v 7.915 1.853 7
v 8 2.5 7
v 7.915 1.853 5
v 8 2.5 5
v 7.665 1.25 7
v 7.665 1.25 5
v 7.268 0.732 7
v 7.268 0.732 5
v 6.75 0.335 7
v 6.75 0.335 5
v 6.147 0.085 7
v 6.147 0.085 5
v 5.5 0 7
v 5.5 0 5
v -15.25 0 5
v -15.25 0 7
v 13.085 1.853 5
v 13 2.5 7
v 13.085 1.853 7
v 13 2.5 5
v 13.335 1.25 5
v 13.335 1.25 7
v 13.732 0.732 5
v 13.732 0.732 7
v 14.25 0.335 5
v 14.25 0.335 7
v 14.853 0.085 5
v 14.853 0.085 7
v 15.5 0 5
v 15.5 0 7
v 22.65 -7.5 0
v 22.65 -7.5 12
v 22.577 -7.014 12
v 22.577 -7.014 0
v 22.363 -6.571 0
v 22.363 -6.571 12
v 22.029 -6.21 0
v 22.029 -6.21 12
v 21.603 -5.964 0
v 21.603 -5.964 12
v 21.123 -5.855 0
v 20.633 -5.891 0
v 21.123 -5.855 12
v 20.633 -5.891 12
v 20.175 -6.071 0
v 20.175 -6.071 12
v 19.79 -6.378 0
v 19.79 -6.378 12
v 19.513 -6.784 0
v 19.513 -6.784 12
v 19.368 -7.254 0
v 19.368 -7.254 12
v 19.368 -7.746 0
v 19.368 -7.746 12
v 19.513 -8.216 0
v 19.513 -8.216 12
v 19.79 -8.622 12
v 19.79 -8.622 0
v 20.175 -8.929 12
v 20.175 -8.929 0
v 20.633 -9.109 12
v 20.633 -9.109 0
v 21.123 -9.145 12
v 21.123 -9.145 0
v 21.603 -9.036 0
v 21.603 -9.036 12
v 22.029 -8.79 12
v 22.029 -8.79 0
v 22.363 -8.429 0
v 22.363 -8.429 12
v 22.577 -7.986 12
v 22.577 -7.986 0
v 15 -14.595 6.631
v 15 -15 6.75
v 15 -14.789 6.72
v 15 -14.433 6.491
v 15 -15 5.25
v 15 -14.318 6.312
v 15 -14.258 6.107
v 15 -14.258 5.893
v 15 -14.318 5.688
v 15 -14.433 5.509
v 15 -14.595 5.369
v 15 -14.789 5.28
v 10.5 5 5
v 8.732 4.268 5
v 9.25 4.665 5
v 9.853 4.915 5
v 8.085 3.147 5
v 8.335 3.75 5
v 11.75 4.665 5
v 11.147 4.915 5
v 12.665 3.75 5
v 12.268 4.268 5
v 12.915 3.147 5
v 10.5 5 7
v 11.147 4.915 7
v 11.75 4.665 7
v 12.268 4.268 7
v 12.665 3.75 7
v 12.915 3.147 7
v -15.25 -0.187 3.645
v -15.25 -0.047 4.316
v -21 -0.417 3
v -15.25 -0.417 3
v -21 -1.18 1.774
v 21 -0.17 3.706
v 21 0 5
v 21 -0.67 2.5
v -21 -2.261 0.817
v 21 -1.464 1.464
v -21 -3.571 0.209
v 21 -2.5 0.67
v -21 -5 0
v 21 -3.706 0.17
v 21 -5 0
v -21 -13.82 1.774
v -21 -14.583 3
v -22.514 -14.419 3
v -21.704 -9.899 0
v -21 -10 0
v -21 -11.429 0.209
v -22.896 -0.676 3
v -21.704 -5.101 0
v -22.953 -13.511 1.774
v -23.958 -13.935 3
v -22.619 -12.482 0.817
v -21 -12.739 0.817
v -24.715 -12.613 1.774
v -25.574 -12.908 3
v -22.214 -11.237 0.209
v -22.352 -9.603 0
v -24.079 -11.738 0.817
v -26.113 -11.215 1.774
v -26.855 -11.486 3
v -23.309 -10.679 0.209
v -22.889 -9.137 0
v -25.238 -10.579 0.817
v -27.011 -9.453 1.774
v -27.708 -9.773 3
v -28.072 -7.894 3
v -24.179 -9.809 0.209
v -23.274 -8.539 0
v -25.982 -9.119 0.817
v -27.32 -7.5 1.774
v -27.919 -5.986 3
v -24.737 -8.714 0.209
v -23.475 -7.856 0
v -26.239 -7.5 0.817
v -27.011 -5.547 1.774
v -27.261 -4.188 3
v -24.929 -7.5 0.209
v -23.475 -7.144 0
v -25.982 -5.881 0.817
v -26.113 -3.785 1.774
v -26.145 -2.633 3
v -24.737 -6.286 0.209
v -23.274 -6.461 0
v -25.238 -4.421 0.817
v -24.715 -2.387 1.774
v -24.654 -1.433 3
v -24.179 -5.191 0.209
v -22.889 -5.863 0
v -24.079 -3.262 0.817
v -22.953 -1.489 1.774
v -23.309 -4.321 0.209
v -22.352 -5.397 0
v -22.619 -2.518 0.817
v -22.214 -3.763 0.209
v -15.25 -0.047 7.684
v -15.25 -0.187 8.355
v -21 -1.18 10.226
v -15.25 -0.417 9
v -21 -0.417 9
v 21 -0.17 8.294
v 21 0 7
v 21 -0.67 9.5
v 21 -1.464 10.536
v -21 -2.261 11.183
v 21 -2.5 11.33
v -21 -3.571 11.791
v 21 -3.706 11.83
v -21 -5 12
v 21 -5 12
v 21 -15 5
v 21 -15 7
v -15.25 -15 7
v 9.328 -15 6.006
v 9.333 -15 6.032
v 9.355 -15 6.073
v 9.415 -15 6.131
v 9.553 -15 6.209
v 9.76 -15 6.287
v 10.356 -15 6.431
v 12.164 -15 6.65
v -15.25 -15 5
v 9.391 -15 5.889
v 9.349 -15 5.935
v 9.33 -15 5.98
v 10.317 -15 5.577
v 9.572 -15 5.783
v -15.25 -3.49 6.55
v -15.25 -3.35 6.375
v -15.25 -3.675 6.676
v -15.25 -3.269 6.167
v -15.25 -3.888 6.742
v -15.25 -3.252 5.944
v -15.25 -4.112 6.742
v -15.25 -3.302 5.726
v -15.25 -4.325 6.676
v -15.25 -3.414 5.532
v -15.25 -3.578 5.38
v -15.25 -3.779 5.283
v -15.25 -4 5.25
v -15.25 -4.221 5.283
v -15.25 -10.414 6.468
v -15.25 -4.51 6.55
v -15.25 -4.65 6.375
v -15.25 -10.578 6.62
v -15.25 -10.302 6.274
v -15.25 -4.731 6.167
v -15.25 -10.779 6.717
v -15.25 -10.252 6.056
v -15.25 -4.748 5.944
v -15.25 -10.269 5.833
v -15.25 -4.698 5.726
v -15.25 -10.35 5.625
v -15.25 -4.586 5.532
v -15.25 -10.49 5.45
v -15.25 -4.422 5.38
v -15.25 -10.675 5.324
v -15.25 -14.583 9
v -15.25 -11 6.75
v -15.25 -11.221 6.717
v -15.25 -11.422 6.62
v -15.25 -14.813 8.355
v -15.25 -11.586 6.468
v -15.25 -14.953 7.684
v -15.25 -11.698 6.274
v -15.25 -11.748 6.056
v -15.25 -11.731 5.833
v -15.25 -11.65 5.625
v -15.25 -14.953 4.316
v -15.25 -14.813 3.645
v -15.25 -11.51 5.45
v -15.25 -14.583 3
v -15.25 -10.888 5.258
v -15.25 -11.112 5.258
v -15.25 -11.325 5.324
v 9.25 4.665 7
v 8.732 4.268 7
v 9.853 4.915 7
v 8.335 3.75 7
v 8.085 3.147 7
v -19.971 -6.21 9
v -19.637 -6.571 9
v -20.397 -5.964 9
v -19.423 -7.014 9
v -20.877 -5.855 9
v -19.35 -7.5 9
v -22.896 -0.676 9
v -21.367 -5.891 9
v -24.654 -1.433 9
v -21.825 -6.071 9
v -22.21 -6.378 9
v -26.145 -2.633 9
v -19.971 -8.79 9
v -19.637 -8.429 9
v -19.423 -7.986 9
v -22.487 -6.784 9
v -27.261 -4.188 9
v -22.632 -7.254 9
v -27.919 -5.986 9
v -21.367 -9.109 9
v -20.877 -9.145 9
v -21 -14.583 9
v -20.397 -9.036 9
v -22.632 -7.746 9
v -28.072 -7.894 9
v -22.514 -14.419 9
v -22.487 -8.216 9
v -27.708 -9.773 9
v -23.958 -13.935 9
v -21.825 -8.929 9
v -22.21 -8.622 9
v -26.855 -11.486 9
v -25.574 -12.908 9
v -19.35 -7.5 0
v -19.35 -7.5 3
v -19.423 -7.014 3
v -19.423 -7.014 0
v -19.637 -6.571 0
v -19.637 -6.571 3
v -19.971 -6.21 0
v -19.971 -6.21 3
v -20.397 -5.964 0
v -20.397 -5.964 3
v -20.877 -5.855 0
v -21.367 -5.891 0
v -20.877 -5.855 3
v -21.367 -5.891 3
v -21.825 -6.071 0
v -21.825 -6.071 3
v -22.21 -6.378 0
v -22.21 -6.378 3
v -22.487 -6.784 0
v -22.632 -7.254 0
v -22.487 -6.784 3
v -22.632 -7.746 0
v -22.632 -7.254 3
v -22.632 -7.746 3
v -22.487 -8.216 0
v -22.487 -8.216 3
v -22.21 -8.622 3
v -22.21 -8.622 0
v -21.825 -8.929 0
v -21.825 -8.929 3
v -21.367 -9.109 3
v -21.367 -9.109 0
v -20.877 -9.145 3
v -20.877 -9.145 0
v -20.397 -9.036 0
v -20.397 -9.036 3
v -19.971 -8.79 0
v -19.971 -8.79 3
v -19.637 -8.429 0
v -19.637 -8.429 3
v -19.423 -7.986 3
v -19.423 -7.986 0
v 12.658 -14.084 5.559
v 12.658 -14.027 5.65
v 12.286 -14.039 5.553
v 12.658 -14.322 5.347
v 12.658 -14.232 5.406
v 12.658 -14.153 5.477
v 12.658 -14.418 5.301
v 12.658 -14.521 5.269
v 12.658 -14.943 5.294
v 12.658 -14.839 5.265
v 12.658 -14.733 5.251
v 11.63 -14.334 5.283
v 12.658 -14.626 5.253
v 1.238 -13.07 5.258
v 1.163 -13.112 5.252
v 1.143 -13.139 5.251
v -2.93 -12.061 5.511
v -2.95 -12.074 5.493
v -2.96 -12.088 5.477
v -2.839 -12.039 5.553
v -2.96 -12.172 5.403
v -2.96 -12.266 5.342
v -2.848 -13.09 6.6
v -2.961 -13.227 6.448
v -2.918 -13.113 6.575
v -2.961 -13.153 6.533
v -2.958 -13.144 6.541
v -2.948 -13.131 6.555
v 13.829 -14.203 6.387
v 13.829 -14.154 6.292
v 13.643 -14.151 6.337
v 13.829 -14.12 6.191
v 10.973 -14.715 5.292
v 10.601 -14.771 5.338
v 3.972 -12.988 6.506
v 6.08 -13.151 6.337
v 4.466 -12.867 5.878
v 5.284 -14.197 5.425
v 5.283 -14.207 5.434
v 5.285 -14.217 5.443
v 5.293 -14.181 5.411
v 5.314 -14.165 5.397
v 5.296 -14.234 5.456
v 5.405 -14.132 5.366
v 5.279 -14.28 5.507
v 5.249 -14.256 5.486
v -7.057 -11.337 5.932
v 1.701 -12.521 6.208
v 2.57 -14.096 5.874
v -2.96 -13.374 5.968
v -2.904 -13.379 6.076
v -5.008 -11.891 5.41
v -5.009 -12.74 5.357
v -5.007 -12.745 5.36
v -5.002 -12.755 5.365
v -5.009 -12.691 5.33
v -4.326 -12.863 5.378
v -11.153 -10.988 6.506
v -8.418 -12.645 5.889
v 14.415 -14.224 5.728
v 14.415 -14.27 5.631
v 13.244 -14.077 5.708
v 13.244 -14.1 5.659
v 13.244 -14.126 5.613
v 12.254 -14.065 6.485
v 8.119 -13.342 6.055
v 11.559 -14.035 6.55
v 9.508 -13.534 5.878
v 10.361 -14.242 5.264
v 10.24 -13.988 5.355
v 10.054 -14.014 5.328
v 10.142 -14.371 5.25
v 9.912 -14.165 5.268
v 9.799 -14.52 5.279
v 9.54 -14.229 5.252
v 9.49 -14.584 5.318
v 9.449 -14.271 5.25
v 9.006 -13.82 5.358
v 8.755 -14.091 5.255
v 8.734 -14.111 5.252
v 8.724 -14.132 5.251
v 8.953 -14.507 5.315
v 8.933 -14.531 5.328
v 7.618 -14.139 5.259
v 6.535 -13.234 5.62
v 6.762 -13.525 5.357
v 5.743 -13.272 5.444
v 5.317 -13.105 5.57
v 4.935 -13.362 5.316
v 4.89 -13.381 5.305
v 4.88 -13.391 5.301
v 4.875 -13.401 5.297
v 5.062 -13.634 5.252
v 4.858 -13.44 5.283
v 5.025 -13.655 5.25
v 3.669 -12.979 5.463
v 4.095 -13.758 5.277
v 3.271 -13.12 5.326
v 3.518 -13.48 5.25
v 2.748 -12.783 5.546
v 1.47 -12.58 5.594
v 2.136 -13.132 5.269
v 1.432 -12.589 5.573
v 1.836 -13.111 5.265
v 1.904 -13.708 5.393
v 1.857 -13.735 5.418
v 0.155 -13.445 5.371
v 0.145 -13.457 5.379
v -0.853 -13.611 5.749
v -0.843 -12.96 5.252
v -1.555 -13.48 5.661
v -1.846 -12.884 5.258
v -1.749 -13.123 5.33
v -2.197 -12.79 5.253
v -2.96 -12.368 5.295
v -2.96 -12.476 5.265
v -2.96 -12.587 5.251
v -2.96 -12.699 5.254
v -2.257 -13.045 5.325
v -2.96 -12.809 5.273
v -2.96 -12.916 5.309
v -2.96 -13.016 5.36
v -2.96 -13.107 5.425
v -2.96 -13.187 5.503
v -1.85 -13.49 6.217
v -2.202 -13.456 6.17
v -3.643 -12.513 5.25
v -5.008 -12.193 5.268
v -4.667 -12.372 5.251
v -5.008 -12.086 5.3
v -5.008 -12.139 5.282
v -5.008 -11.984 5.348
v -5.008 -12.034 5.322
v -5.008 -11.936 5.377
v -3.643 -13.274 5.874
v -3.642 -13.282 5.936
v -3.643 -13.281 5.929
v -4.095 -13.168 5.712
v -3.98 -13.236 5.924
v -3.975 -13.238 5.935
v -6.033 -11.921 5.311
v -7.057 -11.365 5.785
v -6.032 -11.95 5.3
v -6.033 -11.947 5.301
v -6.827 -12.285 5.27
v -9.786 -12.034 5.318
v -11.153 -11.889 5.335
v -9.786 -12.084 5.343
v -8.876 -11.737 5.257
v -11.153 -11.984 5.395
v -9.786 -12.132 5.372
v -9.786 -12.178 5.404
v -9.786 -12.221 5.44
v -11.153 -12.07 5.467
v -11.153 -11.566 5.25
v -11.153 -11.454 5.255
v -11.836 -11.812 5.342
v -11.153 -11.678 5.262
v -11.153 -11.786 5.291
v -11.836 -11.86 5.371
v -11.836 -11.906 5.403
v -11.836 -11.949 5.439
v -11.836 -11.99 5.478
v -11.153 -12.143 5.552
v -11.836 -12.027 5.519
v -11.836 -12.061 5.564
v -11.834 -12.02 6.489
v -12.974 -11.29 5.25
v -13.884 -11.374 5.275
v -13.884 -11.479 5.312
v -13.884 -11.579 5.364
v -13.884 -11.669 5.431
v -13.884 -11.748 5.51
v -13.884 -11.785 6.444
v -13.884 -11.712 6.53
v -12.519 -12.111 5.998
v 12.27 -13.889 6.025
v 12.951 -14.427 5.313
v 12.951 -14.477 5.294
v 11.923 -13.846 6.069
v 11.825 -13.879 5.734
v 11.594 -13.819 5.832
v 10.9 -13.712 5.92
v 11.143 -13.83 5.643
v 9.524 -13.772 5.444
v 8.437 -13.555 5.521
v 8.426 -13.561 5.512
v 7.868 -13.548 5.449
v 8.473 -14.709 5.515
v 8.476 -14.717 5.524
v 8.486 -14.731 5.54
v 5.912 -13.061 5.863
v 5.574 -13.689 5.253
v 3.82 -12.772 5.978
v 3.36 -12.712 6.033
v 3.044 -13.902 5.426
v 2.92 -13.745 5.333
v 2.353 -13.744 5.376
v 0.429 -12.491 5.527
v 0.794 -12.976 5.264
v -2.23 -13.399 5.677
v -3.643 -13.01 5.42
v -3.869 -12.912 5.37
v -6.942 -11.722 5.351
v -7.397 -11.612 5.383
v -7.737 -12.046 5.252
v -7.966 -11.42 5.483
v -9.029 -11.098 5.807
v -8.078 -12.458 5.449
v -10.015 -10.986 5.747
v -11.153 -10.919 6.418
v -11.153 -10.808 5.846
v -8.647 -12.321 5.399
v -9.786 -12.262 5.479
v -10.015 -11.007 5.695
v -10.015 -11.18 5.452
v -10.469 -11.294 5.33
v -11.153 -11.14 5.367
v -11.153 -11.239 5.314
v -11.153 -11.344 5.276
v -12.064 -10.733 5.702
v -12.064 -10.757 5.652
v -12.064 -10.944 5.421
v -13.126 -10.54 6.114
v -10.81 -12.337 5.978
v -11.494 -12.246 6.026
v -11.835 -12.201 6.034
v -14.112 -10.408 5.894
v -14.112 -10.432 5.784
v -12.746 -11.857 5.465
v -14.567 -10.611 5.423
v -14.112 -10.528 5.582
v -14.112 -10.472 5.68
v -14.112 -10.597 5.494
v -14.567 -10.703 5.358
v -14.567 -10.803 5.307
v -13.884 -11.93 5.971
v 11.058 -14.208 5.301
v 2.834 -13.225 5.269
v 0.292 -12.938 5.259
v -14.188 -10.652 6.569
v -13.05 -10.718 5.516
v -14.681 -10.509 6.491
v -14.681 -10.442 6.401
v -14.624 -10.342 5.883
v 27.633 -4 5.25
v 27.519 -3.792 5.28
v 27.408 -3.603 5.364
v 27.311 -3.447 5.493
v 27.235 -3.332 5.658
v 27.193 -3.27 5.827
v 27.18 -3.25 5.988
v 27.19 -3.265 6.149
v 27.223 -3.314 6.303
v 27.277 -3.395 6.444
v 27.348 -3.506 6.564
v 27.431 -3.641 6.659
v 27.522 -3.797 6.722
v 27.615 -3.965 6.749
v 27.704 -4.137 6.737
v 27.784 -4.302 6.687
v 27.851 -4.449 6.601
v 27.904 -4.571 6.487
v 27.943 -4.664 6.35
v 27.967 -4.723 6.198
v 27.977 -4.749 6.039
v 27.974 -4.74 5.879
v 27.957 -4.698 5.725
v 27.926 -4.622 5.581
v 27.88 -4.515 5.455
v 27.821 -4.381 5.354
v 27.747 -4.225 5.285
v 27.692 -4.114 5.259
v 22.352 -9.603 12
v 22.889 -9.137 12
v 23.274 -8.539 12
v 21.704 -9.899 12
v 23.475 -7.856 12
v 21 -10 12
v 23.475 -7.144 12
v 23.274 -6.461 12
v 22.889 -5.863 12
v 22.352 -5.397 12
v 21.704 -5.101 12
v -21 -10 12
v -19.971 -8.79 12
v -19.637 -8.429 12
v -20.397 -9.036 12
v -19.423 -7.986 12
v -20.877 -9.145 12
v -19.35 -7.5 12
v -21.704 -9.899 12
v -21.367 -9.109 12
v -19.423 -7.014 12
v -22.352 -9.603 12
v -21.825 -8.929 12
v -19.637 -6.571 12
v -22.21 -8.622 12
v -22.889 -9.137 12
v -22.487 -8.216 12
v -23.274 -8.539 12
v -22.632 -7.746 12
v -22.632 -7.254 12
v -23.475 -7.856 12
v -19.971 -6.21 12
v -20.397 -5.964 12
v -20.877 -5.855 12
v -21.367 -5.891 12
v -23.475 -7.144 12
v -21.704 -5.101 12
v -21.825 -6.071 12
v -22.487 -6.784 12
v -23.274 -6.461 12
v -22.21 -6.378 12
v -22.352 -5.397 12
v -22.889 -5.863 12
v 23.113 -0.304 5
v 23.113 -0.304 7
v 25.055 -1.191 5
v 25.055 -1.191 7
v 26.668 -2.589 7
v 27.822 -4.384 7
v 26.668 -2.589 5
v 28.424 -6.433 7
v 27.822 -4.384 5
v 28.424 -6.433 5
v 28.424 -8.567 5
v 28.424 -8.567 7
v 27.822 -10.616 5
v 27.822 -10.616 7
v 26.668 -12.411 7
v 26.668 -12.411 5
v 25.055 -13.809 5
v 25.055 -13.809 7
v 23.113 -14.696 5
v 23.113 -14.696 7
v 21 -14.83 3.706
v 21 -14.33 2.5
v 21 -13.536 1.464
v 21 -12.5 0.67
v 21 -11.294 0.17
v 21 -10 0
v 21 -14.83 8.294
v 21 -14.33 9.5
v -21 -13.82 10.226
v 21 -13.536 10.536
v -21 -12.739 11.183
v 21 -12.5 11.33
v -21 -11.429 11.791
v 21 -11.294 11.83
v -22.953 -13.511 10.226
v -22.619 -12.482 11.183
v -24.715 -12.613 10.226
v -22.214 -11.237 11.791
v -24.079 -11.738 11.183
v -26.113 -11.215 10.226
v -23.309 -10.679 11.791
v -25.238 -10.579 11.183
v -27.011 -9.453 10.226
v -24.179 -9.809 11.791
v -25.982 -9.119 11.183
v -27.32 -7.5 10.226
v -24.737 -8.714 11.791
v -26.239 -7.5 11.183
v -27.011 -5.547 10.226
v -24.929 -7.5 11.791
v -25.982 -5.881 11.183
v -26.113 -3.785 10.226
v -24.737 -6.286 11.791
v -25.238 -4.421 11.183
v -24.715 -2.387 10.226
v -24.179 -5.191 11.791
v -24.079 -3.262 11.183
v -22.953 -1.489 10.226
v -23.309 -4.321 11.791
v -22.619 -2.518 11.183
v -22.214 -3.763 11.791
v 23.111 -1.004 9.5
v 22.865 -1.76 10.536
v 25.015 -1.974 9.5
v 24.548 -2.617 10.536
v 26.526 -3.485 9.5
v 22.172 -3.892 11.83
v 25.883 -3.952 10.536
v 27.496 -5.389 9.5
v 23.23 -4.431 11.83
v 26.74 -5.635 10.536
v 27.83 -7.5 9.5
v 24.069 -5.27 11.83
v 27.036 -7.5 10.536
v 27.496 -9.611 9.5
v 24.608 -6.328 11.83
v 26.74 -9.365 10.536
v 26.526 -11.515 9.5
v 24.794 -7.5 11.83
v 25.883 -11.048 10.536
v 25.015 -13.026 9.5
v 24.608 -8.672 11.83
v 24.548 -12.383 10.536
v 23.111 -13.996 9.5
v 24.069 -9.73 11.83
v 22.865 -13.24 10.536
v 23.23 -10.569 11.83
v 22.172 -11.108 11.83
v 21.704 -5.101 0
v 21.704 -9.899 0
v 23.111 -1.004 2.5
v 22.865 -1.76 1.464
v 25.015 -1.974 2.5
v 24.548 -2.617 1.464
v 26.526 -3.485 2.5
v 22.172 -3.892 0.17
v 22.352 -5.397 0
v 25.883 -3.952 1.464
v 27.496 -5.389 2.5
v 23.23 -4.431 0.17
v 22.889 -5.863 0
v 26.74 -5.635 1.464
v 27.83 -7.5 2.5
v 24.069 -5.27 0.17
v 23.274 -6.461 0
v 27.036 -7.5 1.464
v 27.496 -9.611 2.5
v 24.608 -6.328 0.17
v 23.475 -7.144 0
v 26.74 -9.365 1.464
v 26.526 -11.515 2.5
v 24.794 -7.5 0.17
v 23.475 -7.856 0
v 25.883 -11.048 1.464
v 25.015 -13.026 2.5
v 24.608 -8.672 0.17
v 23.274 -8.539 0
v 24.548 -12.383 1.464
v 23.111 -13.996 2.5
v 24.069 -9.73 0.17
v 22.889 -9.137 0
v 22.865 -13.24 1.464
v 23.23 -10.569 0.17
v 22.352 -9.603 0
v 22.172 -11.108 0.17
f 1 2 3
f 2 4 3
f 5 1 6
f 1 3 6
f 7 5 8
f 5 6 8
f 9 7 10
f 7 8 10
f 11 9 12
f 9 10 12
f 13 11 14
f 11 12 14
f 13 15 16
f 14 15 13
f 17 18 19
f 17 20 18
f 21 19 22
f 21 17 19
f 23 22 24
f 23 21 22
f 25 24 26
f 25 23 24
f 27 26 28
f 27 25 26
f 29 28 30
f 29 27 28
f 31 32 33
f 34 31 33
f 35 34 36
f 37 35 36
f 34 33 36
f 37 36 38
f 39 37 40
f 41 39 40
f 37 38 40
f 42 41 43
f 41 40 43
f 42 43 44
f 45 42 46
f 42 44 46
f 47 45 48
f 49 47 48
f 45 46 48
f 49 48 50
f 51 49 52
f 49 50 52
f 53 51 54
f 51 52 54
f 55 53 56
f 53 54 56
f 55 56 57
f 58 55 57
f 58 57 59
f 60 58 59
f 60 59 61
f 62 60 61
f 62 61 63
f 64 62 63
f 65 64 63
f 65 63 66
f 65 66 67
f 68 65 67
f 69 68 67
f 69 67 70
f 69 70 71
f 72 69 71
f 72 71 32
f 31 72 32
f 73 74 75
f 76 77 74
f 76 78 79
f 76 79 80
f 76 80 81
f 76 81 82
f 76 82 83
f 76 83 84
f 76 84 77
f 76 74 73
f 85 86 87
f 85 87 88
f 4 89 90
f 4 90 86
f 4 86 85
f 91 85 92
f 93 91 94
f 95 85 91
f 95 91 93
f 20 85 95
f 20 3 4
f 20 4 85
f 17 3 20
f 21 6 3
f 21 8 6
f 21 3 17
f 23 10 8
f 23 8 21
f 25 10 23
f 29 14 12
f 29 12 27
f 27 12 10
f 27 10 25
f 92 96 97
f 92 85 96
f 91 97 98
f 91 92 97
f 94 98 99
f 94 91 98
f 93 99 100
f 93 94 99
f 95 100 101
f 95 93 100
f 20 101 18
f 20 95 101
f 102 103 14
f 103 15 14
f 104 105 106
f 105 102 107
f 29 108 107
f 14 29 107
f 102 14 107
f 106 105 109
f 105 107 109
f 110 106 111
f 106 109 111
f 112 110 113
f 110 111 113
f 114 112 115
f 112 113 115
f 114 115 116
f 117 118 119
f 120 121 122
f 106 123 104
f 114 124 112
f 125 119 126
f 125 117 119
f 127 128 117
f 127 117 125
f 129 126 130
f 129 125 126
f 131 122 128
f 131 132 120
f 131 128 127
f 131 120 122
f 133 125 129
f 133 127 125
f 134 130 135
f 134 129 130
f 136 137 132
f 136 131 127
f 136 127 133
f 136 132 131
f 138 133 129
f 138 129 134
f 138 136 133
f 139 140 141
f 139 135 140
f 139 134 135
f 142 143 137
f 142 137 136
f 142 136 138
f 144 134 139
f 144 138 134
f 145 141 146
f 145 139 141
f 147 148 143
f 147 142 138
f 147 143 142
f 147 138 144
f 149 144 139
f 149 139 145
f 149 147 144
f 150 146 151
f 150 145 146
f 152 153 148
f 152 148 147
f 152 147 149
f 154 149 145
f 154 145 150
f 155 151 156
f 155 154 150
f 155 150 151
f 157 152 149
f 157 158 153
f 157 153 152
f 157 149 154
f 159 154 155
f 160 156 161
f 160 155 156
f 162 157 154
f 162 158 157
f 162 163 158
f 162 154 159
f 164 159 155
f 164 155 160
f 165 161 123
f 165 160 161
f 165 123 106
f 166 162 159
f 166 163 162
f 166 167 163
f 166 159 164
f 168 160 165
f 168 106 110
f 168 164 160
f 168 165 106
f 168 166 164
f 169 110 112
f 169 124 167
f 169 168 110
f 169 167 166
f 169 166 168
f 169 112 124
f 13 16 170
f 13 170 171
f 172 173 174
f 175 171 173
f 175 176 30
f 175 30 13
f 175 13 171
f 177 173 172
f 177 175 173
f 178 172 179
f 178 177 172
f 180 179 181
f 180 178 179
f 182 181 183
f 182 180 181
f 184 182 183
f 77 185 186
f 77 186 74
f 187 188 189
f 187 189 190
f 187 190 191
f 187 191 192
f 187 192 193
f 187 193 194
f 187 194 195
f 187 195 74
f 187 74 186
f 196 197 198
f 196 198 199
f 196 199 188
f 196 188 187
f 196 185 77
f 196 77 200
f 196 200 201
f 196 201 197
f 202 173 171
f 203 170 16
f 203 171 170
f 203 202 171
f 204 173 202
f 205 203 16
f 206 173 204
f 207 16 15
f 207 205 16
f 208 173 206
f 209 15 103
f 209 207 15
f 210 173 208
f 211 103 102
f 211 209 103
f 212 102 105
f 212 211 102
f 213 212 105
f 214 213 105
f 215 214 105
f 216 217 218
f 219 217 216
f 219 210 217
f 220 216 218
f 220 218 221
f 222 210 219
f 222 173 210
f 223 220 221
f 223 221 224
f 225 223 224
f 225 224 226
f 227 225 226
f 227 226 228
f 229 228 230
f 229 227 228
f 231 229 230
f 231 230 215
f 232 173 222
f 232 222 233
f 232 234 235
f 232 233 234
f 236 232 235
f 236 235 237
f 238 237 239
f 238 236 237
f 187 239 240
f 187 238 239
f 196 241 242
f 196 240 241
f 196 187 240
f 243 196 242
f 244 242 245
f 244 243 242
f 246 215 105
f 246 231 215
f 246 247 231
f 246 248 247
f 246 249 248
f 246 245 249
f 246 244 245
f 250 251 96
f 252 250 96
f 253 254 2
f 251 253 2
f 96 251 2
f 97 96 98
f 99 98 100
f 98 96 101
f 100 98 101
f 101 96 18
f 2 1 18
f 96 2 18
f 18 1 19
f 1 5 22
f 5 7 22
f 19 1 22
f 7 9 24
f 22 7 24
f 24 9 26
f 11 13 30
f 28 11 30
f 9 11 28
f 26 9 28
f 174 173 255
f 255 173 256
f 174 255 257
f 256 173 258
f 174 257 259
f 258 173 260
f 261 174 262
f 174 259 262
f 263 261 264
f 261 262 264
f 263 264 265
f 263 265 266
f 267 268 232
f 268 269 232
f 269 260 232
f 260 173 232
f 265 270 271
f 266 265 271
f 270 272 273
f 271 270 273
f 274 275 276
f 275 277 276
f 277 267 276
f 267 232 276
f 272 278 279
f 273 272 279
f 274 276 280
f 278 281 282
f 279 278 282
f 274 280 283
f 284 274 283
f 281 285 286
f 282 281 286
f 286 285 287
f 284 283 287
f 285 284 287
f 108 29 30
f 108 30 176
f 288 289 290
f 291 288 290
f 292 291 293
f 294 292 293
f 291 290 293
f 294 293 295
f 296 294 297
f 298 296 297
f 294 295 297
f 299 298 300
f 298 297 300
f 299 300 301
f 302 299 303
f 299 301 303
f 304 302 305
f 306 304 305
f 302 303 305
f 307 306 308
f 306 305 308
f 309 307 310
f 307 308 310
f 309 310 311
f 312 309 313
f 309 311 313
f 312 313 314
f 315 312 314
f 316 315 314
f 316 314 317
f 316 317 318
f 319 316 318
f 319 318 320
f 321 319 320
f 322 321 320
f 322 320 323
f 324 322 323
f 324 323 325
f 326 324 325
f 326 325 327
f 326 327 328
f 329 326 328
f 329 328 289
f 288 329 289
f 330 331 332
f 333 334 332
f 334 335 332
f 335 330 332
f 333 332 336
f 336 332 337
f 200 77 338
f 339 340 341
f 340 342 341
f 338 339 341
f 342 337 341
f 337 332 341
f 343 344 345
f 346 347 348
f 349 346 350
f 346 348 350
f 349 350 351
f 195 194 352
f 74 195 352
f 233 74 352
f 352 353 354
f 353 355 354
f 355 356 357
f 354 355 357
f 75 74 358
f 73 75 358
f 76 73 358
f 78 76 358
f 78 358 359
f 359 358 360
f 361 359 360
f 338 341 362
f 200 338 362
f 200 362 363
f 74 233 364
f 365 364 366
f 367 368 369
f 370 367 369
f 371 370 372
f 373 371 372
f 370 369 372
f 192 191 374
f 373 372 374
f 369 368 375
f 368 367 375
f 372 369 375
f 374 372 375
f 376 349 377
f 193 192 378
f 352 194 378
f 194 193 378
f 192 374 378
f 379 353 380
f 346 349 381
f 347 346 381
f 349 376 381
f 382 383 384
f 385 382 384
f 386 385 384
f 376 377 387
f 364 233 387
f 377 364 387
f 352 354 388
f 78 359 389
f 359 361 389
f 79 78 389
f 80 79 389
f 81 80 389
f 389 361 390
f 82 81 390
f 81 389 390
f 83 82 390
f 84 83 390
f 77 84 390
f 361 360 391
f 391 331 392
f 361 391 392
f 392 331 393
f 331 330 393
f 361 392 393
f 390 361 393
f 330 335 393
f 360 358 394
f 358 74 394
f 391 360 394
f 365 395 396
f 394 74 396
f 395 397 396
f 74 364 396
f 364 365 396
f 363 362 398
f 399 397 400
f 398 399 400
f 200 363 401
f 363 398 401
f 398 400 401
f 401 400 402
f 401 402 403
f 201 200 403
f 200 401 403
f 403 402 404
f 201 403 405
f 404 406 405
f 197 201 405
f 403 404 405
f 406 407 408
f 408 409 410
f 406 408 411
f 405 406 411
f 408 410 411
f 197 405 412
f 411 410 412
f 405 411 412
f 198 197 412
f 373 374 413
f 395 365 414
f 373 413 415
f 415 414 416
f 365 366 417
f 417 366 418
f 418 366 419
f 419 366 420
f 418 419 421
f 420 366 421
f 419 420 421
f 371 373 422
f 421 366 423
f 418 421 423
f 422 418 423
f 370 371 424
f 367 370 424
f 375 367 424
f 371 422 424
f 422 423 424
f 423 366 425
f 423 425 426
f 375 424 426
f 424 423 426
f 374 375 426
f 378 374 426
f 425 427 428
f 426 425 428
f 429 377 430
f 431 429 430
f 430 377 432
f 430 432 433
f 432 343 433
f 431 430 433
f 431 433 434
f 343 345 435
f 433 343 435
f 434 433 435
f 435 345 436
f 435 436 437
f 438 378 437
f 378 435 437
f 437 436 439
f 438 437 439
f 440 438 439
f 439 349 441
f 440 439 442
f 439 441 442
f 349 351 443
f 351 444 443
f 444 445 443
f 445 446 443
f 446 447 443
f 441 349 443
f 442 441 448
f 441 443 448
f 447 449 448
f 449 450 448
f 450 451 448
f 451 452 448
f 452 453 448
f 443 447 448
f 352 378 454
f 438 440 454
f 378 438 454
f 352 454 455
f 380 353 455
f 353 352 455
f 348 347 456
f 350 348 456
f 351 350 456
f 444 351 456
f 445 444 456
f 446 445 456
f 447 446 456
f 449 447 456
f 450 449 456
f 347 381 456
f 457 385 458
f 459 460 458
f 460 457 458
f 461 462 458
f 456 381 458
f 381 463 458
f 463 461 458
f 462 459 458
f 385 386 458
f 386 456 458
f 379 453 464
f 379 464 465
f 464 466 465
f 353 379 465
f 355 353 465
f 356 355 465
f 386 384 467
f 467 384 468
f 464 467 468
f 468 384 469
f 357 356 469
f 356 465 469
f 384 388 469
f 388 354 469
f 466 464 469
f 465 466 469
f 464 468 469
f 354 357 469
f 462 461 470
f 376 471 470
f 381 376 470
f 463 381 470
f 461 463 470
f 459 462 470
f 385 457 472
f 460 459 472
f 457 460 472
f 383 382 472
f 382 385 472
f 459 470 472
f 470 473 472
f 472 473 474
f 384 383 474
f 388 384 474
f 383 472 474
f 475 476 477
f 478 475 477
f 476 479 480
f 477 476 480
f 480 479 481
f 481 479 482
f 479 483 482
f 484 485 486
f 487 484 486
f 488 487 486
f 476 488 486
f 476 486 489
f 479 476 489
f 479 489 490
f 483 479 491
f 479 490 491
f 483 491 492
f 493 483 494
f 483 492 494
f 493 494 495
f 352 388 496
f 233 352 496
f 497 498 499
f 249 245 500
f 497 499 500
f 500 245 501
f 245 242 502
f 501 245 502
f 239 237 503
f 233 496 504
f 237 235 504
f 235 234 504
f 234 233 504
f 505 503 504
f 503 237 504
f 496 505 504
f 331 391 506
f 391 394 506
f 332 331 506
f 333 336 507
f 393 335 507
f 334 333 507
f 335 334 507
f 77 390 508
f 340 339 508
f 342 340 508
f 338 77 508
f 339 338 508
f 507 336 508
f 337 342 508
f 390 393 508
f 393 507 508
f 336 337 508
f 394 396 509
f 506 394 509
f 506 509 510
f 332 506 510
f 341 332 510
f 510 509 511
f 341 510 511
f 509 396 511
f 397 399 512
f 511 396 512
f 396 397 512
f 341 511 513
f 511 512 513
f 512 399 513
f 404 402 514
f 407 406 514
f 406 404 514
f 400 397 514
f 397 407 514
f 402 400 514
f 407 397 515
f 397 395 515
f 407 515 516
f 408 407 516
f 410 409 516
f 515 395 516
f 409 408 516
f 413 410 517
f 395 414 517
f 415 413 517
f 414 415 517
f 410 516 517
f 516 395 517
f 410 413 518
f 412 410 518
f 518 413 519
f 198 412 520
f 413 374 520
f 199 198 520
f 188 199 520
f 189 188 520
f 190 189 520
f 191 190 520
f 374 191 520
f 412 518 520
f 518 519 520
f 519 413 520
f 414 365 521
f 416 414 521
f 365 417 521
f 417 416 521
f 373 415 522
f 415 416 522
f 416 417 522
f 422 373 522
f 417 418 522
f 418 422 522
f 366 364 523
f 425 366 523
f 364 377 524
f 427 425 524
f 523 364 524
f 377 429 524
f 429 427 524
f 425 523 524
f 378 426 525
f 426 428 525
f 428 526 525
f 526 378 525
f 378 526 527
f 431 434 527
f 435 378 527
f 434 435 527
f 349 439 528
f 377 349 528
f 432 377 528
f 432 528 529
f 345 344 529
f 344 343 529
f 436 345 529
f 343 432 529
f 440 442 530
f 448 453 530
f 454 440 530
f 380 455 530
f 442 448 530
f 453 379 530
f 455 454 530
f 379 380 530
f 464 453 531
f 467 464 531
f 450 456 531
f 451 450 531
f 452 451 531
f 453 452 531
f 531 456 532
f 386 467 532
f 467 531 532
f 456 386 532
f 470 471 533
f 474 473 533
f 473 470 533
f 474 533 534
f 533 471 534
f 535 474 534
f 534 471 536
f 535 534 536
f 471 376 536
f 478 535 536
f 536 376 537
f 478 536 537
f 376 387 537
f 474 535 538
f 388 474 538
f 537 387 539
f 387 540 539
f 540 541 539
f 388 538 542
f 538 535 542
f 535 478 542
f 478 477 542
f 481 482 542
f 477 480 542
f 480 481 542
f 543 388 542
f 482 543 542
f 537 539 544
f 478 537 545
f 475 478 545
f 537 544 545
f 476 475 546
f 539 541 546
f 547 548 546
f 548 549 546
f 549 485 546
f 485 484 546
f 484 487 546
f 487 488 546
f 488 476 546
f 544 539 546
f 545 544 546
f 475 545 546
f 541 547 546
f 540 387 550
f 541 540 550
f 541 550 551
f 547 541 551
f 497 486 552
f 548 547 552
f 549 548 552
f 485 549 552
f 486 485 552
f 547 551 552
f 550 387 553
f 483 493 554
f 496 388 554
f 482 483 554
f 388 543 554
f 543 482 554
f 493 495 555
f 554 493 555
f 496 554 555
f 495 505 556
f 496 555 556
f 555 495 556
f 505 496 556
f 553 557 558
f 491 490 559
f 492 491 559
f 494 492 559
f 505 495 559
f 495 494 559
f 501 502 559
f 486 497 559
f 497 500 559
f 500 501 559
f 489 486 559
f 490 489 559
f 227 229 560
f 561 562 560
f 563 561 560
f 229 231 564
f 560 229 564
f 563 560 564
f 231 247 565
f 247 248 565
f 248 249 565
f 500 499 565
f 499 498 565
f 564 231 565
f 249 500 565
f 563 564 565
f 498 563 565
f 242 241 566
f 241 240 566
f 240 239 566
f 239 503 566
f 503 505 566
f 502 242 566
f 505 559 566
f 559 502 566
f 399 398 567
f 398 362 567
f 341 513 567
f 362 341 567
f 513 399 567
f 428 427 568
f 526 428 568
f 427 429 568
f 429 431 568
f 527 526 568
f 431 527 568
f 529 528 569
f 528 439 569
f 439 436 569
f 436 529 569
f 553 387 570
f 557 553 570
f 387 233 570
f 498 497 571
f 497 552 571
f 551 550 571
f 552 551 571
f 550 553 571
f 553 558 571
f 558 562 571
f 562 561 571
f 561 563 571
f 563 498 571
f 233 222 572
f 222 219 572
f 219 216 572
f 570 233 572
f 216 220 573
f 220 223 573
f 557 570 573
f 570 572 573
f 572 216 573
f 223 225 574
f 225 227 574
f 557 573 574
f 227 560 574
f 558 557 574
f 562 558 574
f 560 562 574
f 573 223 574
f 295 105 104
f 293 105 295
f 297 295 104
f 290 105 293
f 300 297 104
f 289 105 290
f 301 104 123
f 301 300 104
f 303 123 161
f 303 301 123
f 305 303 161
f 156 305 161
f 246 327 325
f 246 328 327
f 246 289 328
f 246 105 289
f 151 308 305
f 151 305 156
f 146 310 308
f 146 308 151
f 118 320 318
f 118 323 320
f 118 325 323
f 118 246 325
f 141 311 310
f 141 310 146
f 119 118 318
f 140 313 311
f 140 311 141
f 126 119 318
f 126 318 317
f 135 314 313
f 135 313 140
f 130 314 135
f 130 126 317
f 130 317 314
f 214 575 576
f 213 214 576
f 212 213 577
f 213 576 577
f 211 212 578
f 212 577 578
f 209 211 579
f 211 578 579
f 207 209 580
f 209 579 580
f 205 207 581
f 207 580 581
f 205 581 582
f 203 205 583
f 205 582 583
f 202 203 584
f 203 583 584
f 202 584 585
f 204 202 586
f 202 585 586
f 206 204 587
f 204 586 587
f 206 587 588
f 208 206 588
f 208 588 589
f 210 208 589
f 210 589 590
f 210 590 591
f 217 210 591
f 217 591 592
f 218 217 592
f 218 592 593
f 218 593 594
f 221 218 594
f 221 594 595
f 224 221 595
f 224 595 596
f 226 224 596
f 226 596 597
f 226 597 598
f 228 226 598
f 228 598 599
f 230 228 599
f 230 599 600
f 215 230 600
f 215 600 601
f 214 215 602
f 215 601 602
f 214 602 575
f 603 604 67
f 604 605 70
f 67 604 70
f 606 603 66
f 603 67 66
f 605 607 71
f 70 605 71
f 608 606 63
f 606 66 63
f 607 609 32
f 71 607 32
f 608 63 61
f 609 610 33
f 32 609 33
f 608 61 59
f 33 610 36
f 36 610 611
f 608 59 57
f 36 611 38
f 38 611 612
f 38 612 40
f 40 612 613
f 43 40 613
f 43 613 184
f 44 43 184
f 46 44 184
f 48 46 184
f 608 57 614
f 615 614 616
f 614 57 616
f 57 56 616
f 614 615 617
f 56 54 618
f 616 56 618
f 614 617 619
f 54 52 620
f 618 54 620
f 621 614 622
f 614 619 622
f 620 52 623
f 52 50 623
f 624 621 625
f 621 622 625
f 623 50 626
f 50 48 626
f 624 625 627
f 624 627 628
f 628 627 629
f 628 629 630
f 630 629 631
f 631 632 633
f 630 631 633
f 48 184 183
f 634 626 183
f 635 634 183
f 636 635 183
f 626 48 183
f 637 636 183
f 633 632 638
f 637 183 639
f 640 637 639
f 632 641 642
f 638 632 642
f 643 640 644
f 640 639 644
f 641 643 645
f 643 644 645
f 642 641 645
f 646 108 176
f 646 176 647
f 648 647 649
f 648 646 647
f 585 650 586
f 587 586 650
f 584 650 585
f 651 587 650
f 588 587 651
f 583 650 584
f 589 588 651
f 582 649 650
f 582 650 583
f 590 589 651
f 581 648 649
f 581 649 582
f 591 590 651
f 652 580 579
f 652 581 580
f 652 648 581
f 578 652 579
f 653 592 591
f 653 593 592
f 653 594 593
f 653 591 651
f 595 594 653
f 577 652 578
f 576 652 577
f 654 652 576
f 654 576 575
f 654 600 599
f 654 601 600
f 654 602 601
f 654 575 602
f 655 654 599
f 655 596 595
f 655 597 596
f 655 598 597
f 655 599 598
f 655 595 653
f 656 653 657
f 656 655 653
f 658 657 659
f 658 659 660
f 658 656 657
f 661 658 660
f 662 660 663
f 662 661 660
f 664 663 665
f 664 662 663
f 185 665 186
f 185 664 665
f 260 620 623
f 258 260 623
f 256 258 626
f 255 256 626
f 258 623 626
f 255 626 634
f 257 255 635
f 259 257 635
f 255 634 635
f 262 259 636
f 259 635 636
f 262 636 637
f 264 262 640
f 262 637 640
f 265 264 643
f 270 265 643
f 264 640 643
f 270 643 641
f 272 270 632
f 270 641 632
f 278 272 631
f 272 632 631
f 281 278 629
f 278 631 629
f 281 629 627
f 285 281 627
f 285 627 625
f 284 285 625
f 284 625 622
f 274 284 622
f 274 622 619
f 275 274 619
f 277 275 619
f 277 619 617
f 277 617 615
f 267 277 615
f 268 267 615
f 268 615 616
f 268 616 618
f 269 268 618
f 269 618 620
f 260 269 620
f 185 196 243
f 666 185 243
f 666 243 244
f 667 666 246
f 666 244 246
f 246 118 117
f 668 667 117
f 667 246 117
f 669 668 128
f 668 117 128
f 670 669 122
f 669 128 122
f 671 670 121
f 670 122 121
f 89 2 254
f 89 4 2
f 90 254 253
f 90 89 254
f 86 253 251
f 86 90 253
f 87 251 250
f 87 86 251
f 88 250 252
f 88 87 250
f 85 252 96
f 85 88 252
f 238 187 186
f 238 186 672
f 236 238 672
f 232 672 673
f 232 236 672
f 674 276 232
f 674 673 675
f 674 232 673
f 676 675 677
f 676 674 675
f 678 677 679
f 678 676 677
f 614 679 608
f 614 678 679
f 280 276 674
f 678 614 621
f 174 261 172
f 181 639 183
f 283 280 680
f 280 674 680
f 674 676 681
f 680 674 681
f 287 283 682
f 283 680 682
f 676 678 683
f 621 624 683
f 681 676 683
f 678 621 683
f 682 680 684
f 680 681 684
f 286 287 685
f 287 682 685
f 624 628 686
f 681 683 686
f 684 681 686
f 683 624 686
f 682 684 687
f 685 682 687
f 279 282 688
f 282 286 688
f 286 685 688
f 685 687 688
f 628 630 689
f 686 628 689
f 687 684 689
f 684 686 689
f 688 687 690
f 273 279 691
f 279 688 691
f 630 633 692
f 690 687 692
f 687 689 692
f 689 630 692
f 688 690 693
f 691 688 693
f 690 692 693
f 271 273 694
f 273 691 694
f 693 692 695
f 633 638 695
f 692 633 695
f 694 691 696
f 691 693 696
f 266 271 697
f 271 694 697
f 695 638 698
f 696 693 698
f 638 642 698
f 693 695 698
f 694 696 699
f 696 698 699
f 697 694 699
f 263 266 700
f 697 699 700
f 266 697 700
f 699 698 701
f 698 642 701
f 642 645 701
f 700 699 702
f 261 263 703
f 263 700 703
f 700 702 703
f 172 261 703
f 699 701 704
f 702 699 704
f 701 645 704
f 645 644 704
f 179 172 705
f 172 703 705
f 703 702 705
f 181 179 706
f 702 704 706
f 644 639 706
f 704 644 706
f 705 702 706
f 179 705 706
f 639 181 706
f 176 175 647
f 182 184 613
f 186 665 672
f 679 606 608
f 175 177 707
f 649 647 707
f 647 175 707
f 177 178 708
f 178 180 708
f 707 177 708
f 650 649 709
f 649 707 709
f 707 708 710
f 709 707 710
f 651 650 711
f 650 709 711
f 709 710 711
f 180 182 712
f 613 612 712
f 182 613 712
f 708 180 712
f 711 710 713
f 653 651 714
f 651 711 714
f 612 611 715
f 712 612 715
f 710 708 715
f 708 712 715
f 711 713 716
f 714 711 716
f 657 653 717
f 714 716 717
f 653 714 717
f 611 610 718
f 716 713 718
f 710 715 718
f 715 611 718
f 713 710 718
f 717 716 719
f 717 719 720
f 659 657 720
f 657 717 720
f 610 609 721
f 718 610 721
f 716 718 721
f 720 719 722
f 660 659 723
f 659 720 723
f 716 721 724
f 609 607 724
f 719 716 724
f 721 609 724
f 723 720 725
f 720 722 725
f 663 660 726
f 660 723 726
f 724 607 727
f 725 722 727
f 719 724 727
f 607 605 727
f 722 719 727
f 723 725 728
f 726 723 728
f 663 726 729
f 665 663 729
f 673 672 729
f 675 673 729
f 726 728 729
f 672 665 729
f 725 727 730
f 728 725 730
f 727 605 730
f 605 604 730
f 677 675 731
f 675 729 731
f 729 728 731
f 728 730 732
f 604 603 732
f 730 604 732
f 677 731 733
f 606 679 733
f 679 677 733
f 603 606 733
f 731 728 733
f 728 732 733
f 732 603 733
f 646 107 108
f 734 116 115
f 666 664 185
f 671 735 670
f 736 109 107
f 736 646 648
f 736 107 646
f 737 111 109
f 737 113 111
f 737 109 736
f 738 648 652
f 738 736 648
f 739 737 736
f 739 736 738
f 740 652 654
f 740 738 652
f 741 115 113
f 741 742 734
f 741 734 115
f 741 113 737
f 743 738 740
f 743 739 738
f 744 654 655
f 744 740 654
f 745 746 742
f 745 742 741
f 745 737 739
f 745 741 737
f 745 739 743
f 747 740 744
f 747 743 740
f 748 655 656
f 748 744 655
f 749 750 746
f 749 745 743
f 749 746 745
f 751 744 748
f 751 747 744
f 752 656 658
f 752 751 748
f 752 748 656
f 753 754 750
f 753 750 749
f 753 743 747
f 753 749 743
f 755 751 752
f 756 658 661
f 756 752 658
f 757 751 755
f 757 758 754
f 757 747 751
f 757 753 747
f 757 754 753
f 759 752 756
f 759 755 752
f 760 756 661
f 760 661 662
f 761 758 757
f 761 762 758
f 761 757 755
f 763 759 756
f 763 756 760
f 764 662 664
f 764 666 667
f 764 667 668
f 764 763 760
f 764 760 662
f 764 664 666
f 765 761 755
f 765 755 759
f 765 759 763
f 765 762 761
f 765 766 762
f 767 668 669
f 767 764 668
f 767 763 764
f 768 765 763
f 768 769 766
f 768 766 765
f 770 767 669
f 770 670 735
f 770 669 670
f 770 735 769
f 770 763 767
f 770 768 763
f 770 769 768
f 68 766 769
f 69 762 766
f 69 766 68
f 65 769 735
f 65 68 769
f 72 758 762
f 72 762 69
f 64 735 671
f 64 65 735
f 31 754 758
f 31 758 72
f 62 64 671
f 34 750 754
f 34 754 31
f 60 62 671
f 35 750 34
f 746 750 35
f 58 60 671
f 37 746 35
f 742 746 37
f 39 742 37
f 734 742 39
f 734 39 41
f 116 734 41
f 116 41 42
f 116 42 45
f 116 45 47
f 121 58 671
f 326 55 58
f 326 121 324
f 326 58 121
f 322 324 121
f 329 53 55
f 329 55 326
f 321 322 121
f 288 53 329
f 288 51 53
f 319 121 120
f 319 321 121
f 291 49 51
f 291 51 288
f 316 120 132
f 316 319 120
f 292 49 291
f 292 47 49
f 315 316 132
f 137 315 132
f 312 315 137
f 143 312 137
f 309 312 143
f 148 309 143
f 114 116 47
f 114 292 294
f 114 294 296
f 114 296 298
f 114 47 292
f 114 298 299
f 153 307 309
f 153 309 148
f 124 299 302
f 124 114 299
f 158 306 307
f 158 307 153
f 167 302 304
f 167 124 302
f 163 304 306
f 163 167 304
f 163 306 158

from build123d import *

# Parameters (mm, degrees)
BOSS_EXTRUDE1_DEPTH = 12
FILLET1_R           = 5
SKETCH5_W           = 13.25
SKETCH5_H           = 6
CUT_EXTRUDE3_DEPTH  = 40.764934301
SKETCH6_W           = 5
SKETCH6_H           = 2
BOSS_EXTRUDE2_DEPTH = 5
FILLET2_R           = 2.5
FILLET3_R           = 2.5
SKETCH3_R           = 1.65
CUT_EXTRUDE4_DEPTH  = 35.369317791
SKETCH8_R           = 0.75
CUT_EXTRUDE7_DEPTH  = 60.754396399
SKETCH9_R           = 0.75
CUT_EXTRUDE9_DEPTH  = 30.513316765


with BuildPart() as part:
    # Sketch2 → Boss-Extrude1 (new body)
    with BuildSketch(Plane.XY):
        with BuildLine():
            Line((-21, 0), (21, 0))
            ThreePointArc((21, 0), (28.5, -7.5), (21, -15))
            Line((21, -15), (-21, -15))
            ThreePointArc((-21, -15), (-28.5, -7.5), (-21, 0))
        make_face()
    extrude(amount=BOSS_EXTRUDE1_DEPTH)

    # Fillet1
    fillet1_edges = [part.edges().sort_by_distance(p)[0] for p in [
        (-28.5, -7.5, 12),
        (0, -15, 12),
        (28.5, -7.5, 12),
        (0, -15, 0),
        (-28.5, -7.5, 0),
        (0, 0, 0),
        (28.5, -7.5, 0),
        (0, 0, 12),
    ]]
    fillet(fillet1_edges, radius=FILLET1_R)

    # Sketch5 → Cut-Extrude3 (cut, through all)
    with BuildSketch(Plane(origin=(0, -25, 0), x_dir=(-1, 0, 0), z_dir=(0, -1, 0))):
        with Locations((21.875, -6)):
            Rectangle(SKETCH5_W, SKETCH5_H)
    extrude(amount=-CUT_EXTRUDE3_DEPTH, mode=Mode.SUBTRACT)

    # Sketch6 → Boss-Extrude2 (add)
    with BuildSketch(Plane(origin=(0, 0, 0), x_dir=(1, 0, 0), z_dir=(0, 1, 0))):
        with Locations((10.5, -6)):
            Rectangle(SKETCH6_W, SKETCH6_H)
    extrude(amount=BOSS_EXTRUDE2_DEPTH)

    # Fillet2
    fillet2_edges = [part.edges().sort_by_distance(p)[0] for p in [
        (13, 5, 6),
        (8, 5, 6),
    ]]
    fillet(fillet2_edges, radius=FILLET2_R - 0.0001)  # a hair under: the kernel refuses the full size

    # Fillet3
    fillet3_edges = [part.edges().sort_by_distance(p)[0] for p in [
        (8, 0, 6),
        (13, 0, 6),
    ]]
    fillet(fillet3_edges, radius=FILLET3_R)

    # Sketch3 → Cut-Extrude4 (cut, through all)
    with BuildSketch(Plane.XY.offset(12)):
        with Locations((-21, -7.5)):
            Circle(SKETCH3_R)
        with Locations((21, -7.5)):
            Circle(SKETCH3_R)
    extrude(amount=-CUT_EXTRUDE4_DEPTH, mode=Mode.SUBTRACT)

    # Sketch8 → Cut-Extrude7 (cut, through all)
    with BuildSketch(Plane(origin=(28.5, 0, 0), x_dir=(0, 0, -1), z_dir=(1, 0, 0))):
        with Locations((-6, -4)):
            Circle(SKETCH8_R)
    extrude(amount=-CUT_EXTRUDE7_DEPTH, mode=Mode.SUBTRACT)

    # Sketch9 → Cut-Extrude9 (cut, along a direction that is not the sketch's normal)
    with BuildSketch(Plane.ZY.offset(15.25)):
        with Locations((6, -11)):
            Circle(SKETCH9_R)
    extrude(amount=-CUT_EXTRUDE9_DEPTH, dir=(-0.9913704312445624, 0.1310903049579585, 0), mode=Mode.SUBTRACT)


solid = part.part
